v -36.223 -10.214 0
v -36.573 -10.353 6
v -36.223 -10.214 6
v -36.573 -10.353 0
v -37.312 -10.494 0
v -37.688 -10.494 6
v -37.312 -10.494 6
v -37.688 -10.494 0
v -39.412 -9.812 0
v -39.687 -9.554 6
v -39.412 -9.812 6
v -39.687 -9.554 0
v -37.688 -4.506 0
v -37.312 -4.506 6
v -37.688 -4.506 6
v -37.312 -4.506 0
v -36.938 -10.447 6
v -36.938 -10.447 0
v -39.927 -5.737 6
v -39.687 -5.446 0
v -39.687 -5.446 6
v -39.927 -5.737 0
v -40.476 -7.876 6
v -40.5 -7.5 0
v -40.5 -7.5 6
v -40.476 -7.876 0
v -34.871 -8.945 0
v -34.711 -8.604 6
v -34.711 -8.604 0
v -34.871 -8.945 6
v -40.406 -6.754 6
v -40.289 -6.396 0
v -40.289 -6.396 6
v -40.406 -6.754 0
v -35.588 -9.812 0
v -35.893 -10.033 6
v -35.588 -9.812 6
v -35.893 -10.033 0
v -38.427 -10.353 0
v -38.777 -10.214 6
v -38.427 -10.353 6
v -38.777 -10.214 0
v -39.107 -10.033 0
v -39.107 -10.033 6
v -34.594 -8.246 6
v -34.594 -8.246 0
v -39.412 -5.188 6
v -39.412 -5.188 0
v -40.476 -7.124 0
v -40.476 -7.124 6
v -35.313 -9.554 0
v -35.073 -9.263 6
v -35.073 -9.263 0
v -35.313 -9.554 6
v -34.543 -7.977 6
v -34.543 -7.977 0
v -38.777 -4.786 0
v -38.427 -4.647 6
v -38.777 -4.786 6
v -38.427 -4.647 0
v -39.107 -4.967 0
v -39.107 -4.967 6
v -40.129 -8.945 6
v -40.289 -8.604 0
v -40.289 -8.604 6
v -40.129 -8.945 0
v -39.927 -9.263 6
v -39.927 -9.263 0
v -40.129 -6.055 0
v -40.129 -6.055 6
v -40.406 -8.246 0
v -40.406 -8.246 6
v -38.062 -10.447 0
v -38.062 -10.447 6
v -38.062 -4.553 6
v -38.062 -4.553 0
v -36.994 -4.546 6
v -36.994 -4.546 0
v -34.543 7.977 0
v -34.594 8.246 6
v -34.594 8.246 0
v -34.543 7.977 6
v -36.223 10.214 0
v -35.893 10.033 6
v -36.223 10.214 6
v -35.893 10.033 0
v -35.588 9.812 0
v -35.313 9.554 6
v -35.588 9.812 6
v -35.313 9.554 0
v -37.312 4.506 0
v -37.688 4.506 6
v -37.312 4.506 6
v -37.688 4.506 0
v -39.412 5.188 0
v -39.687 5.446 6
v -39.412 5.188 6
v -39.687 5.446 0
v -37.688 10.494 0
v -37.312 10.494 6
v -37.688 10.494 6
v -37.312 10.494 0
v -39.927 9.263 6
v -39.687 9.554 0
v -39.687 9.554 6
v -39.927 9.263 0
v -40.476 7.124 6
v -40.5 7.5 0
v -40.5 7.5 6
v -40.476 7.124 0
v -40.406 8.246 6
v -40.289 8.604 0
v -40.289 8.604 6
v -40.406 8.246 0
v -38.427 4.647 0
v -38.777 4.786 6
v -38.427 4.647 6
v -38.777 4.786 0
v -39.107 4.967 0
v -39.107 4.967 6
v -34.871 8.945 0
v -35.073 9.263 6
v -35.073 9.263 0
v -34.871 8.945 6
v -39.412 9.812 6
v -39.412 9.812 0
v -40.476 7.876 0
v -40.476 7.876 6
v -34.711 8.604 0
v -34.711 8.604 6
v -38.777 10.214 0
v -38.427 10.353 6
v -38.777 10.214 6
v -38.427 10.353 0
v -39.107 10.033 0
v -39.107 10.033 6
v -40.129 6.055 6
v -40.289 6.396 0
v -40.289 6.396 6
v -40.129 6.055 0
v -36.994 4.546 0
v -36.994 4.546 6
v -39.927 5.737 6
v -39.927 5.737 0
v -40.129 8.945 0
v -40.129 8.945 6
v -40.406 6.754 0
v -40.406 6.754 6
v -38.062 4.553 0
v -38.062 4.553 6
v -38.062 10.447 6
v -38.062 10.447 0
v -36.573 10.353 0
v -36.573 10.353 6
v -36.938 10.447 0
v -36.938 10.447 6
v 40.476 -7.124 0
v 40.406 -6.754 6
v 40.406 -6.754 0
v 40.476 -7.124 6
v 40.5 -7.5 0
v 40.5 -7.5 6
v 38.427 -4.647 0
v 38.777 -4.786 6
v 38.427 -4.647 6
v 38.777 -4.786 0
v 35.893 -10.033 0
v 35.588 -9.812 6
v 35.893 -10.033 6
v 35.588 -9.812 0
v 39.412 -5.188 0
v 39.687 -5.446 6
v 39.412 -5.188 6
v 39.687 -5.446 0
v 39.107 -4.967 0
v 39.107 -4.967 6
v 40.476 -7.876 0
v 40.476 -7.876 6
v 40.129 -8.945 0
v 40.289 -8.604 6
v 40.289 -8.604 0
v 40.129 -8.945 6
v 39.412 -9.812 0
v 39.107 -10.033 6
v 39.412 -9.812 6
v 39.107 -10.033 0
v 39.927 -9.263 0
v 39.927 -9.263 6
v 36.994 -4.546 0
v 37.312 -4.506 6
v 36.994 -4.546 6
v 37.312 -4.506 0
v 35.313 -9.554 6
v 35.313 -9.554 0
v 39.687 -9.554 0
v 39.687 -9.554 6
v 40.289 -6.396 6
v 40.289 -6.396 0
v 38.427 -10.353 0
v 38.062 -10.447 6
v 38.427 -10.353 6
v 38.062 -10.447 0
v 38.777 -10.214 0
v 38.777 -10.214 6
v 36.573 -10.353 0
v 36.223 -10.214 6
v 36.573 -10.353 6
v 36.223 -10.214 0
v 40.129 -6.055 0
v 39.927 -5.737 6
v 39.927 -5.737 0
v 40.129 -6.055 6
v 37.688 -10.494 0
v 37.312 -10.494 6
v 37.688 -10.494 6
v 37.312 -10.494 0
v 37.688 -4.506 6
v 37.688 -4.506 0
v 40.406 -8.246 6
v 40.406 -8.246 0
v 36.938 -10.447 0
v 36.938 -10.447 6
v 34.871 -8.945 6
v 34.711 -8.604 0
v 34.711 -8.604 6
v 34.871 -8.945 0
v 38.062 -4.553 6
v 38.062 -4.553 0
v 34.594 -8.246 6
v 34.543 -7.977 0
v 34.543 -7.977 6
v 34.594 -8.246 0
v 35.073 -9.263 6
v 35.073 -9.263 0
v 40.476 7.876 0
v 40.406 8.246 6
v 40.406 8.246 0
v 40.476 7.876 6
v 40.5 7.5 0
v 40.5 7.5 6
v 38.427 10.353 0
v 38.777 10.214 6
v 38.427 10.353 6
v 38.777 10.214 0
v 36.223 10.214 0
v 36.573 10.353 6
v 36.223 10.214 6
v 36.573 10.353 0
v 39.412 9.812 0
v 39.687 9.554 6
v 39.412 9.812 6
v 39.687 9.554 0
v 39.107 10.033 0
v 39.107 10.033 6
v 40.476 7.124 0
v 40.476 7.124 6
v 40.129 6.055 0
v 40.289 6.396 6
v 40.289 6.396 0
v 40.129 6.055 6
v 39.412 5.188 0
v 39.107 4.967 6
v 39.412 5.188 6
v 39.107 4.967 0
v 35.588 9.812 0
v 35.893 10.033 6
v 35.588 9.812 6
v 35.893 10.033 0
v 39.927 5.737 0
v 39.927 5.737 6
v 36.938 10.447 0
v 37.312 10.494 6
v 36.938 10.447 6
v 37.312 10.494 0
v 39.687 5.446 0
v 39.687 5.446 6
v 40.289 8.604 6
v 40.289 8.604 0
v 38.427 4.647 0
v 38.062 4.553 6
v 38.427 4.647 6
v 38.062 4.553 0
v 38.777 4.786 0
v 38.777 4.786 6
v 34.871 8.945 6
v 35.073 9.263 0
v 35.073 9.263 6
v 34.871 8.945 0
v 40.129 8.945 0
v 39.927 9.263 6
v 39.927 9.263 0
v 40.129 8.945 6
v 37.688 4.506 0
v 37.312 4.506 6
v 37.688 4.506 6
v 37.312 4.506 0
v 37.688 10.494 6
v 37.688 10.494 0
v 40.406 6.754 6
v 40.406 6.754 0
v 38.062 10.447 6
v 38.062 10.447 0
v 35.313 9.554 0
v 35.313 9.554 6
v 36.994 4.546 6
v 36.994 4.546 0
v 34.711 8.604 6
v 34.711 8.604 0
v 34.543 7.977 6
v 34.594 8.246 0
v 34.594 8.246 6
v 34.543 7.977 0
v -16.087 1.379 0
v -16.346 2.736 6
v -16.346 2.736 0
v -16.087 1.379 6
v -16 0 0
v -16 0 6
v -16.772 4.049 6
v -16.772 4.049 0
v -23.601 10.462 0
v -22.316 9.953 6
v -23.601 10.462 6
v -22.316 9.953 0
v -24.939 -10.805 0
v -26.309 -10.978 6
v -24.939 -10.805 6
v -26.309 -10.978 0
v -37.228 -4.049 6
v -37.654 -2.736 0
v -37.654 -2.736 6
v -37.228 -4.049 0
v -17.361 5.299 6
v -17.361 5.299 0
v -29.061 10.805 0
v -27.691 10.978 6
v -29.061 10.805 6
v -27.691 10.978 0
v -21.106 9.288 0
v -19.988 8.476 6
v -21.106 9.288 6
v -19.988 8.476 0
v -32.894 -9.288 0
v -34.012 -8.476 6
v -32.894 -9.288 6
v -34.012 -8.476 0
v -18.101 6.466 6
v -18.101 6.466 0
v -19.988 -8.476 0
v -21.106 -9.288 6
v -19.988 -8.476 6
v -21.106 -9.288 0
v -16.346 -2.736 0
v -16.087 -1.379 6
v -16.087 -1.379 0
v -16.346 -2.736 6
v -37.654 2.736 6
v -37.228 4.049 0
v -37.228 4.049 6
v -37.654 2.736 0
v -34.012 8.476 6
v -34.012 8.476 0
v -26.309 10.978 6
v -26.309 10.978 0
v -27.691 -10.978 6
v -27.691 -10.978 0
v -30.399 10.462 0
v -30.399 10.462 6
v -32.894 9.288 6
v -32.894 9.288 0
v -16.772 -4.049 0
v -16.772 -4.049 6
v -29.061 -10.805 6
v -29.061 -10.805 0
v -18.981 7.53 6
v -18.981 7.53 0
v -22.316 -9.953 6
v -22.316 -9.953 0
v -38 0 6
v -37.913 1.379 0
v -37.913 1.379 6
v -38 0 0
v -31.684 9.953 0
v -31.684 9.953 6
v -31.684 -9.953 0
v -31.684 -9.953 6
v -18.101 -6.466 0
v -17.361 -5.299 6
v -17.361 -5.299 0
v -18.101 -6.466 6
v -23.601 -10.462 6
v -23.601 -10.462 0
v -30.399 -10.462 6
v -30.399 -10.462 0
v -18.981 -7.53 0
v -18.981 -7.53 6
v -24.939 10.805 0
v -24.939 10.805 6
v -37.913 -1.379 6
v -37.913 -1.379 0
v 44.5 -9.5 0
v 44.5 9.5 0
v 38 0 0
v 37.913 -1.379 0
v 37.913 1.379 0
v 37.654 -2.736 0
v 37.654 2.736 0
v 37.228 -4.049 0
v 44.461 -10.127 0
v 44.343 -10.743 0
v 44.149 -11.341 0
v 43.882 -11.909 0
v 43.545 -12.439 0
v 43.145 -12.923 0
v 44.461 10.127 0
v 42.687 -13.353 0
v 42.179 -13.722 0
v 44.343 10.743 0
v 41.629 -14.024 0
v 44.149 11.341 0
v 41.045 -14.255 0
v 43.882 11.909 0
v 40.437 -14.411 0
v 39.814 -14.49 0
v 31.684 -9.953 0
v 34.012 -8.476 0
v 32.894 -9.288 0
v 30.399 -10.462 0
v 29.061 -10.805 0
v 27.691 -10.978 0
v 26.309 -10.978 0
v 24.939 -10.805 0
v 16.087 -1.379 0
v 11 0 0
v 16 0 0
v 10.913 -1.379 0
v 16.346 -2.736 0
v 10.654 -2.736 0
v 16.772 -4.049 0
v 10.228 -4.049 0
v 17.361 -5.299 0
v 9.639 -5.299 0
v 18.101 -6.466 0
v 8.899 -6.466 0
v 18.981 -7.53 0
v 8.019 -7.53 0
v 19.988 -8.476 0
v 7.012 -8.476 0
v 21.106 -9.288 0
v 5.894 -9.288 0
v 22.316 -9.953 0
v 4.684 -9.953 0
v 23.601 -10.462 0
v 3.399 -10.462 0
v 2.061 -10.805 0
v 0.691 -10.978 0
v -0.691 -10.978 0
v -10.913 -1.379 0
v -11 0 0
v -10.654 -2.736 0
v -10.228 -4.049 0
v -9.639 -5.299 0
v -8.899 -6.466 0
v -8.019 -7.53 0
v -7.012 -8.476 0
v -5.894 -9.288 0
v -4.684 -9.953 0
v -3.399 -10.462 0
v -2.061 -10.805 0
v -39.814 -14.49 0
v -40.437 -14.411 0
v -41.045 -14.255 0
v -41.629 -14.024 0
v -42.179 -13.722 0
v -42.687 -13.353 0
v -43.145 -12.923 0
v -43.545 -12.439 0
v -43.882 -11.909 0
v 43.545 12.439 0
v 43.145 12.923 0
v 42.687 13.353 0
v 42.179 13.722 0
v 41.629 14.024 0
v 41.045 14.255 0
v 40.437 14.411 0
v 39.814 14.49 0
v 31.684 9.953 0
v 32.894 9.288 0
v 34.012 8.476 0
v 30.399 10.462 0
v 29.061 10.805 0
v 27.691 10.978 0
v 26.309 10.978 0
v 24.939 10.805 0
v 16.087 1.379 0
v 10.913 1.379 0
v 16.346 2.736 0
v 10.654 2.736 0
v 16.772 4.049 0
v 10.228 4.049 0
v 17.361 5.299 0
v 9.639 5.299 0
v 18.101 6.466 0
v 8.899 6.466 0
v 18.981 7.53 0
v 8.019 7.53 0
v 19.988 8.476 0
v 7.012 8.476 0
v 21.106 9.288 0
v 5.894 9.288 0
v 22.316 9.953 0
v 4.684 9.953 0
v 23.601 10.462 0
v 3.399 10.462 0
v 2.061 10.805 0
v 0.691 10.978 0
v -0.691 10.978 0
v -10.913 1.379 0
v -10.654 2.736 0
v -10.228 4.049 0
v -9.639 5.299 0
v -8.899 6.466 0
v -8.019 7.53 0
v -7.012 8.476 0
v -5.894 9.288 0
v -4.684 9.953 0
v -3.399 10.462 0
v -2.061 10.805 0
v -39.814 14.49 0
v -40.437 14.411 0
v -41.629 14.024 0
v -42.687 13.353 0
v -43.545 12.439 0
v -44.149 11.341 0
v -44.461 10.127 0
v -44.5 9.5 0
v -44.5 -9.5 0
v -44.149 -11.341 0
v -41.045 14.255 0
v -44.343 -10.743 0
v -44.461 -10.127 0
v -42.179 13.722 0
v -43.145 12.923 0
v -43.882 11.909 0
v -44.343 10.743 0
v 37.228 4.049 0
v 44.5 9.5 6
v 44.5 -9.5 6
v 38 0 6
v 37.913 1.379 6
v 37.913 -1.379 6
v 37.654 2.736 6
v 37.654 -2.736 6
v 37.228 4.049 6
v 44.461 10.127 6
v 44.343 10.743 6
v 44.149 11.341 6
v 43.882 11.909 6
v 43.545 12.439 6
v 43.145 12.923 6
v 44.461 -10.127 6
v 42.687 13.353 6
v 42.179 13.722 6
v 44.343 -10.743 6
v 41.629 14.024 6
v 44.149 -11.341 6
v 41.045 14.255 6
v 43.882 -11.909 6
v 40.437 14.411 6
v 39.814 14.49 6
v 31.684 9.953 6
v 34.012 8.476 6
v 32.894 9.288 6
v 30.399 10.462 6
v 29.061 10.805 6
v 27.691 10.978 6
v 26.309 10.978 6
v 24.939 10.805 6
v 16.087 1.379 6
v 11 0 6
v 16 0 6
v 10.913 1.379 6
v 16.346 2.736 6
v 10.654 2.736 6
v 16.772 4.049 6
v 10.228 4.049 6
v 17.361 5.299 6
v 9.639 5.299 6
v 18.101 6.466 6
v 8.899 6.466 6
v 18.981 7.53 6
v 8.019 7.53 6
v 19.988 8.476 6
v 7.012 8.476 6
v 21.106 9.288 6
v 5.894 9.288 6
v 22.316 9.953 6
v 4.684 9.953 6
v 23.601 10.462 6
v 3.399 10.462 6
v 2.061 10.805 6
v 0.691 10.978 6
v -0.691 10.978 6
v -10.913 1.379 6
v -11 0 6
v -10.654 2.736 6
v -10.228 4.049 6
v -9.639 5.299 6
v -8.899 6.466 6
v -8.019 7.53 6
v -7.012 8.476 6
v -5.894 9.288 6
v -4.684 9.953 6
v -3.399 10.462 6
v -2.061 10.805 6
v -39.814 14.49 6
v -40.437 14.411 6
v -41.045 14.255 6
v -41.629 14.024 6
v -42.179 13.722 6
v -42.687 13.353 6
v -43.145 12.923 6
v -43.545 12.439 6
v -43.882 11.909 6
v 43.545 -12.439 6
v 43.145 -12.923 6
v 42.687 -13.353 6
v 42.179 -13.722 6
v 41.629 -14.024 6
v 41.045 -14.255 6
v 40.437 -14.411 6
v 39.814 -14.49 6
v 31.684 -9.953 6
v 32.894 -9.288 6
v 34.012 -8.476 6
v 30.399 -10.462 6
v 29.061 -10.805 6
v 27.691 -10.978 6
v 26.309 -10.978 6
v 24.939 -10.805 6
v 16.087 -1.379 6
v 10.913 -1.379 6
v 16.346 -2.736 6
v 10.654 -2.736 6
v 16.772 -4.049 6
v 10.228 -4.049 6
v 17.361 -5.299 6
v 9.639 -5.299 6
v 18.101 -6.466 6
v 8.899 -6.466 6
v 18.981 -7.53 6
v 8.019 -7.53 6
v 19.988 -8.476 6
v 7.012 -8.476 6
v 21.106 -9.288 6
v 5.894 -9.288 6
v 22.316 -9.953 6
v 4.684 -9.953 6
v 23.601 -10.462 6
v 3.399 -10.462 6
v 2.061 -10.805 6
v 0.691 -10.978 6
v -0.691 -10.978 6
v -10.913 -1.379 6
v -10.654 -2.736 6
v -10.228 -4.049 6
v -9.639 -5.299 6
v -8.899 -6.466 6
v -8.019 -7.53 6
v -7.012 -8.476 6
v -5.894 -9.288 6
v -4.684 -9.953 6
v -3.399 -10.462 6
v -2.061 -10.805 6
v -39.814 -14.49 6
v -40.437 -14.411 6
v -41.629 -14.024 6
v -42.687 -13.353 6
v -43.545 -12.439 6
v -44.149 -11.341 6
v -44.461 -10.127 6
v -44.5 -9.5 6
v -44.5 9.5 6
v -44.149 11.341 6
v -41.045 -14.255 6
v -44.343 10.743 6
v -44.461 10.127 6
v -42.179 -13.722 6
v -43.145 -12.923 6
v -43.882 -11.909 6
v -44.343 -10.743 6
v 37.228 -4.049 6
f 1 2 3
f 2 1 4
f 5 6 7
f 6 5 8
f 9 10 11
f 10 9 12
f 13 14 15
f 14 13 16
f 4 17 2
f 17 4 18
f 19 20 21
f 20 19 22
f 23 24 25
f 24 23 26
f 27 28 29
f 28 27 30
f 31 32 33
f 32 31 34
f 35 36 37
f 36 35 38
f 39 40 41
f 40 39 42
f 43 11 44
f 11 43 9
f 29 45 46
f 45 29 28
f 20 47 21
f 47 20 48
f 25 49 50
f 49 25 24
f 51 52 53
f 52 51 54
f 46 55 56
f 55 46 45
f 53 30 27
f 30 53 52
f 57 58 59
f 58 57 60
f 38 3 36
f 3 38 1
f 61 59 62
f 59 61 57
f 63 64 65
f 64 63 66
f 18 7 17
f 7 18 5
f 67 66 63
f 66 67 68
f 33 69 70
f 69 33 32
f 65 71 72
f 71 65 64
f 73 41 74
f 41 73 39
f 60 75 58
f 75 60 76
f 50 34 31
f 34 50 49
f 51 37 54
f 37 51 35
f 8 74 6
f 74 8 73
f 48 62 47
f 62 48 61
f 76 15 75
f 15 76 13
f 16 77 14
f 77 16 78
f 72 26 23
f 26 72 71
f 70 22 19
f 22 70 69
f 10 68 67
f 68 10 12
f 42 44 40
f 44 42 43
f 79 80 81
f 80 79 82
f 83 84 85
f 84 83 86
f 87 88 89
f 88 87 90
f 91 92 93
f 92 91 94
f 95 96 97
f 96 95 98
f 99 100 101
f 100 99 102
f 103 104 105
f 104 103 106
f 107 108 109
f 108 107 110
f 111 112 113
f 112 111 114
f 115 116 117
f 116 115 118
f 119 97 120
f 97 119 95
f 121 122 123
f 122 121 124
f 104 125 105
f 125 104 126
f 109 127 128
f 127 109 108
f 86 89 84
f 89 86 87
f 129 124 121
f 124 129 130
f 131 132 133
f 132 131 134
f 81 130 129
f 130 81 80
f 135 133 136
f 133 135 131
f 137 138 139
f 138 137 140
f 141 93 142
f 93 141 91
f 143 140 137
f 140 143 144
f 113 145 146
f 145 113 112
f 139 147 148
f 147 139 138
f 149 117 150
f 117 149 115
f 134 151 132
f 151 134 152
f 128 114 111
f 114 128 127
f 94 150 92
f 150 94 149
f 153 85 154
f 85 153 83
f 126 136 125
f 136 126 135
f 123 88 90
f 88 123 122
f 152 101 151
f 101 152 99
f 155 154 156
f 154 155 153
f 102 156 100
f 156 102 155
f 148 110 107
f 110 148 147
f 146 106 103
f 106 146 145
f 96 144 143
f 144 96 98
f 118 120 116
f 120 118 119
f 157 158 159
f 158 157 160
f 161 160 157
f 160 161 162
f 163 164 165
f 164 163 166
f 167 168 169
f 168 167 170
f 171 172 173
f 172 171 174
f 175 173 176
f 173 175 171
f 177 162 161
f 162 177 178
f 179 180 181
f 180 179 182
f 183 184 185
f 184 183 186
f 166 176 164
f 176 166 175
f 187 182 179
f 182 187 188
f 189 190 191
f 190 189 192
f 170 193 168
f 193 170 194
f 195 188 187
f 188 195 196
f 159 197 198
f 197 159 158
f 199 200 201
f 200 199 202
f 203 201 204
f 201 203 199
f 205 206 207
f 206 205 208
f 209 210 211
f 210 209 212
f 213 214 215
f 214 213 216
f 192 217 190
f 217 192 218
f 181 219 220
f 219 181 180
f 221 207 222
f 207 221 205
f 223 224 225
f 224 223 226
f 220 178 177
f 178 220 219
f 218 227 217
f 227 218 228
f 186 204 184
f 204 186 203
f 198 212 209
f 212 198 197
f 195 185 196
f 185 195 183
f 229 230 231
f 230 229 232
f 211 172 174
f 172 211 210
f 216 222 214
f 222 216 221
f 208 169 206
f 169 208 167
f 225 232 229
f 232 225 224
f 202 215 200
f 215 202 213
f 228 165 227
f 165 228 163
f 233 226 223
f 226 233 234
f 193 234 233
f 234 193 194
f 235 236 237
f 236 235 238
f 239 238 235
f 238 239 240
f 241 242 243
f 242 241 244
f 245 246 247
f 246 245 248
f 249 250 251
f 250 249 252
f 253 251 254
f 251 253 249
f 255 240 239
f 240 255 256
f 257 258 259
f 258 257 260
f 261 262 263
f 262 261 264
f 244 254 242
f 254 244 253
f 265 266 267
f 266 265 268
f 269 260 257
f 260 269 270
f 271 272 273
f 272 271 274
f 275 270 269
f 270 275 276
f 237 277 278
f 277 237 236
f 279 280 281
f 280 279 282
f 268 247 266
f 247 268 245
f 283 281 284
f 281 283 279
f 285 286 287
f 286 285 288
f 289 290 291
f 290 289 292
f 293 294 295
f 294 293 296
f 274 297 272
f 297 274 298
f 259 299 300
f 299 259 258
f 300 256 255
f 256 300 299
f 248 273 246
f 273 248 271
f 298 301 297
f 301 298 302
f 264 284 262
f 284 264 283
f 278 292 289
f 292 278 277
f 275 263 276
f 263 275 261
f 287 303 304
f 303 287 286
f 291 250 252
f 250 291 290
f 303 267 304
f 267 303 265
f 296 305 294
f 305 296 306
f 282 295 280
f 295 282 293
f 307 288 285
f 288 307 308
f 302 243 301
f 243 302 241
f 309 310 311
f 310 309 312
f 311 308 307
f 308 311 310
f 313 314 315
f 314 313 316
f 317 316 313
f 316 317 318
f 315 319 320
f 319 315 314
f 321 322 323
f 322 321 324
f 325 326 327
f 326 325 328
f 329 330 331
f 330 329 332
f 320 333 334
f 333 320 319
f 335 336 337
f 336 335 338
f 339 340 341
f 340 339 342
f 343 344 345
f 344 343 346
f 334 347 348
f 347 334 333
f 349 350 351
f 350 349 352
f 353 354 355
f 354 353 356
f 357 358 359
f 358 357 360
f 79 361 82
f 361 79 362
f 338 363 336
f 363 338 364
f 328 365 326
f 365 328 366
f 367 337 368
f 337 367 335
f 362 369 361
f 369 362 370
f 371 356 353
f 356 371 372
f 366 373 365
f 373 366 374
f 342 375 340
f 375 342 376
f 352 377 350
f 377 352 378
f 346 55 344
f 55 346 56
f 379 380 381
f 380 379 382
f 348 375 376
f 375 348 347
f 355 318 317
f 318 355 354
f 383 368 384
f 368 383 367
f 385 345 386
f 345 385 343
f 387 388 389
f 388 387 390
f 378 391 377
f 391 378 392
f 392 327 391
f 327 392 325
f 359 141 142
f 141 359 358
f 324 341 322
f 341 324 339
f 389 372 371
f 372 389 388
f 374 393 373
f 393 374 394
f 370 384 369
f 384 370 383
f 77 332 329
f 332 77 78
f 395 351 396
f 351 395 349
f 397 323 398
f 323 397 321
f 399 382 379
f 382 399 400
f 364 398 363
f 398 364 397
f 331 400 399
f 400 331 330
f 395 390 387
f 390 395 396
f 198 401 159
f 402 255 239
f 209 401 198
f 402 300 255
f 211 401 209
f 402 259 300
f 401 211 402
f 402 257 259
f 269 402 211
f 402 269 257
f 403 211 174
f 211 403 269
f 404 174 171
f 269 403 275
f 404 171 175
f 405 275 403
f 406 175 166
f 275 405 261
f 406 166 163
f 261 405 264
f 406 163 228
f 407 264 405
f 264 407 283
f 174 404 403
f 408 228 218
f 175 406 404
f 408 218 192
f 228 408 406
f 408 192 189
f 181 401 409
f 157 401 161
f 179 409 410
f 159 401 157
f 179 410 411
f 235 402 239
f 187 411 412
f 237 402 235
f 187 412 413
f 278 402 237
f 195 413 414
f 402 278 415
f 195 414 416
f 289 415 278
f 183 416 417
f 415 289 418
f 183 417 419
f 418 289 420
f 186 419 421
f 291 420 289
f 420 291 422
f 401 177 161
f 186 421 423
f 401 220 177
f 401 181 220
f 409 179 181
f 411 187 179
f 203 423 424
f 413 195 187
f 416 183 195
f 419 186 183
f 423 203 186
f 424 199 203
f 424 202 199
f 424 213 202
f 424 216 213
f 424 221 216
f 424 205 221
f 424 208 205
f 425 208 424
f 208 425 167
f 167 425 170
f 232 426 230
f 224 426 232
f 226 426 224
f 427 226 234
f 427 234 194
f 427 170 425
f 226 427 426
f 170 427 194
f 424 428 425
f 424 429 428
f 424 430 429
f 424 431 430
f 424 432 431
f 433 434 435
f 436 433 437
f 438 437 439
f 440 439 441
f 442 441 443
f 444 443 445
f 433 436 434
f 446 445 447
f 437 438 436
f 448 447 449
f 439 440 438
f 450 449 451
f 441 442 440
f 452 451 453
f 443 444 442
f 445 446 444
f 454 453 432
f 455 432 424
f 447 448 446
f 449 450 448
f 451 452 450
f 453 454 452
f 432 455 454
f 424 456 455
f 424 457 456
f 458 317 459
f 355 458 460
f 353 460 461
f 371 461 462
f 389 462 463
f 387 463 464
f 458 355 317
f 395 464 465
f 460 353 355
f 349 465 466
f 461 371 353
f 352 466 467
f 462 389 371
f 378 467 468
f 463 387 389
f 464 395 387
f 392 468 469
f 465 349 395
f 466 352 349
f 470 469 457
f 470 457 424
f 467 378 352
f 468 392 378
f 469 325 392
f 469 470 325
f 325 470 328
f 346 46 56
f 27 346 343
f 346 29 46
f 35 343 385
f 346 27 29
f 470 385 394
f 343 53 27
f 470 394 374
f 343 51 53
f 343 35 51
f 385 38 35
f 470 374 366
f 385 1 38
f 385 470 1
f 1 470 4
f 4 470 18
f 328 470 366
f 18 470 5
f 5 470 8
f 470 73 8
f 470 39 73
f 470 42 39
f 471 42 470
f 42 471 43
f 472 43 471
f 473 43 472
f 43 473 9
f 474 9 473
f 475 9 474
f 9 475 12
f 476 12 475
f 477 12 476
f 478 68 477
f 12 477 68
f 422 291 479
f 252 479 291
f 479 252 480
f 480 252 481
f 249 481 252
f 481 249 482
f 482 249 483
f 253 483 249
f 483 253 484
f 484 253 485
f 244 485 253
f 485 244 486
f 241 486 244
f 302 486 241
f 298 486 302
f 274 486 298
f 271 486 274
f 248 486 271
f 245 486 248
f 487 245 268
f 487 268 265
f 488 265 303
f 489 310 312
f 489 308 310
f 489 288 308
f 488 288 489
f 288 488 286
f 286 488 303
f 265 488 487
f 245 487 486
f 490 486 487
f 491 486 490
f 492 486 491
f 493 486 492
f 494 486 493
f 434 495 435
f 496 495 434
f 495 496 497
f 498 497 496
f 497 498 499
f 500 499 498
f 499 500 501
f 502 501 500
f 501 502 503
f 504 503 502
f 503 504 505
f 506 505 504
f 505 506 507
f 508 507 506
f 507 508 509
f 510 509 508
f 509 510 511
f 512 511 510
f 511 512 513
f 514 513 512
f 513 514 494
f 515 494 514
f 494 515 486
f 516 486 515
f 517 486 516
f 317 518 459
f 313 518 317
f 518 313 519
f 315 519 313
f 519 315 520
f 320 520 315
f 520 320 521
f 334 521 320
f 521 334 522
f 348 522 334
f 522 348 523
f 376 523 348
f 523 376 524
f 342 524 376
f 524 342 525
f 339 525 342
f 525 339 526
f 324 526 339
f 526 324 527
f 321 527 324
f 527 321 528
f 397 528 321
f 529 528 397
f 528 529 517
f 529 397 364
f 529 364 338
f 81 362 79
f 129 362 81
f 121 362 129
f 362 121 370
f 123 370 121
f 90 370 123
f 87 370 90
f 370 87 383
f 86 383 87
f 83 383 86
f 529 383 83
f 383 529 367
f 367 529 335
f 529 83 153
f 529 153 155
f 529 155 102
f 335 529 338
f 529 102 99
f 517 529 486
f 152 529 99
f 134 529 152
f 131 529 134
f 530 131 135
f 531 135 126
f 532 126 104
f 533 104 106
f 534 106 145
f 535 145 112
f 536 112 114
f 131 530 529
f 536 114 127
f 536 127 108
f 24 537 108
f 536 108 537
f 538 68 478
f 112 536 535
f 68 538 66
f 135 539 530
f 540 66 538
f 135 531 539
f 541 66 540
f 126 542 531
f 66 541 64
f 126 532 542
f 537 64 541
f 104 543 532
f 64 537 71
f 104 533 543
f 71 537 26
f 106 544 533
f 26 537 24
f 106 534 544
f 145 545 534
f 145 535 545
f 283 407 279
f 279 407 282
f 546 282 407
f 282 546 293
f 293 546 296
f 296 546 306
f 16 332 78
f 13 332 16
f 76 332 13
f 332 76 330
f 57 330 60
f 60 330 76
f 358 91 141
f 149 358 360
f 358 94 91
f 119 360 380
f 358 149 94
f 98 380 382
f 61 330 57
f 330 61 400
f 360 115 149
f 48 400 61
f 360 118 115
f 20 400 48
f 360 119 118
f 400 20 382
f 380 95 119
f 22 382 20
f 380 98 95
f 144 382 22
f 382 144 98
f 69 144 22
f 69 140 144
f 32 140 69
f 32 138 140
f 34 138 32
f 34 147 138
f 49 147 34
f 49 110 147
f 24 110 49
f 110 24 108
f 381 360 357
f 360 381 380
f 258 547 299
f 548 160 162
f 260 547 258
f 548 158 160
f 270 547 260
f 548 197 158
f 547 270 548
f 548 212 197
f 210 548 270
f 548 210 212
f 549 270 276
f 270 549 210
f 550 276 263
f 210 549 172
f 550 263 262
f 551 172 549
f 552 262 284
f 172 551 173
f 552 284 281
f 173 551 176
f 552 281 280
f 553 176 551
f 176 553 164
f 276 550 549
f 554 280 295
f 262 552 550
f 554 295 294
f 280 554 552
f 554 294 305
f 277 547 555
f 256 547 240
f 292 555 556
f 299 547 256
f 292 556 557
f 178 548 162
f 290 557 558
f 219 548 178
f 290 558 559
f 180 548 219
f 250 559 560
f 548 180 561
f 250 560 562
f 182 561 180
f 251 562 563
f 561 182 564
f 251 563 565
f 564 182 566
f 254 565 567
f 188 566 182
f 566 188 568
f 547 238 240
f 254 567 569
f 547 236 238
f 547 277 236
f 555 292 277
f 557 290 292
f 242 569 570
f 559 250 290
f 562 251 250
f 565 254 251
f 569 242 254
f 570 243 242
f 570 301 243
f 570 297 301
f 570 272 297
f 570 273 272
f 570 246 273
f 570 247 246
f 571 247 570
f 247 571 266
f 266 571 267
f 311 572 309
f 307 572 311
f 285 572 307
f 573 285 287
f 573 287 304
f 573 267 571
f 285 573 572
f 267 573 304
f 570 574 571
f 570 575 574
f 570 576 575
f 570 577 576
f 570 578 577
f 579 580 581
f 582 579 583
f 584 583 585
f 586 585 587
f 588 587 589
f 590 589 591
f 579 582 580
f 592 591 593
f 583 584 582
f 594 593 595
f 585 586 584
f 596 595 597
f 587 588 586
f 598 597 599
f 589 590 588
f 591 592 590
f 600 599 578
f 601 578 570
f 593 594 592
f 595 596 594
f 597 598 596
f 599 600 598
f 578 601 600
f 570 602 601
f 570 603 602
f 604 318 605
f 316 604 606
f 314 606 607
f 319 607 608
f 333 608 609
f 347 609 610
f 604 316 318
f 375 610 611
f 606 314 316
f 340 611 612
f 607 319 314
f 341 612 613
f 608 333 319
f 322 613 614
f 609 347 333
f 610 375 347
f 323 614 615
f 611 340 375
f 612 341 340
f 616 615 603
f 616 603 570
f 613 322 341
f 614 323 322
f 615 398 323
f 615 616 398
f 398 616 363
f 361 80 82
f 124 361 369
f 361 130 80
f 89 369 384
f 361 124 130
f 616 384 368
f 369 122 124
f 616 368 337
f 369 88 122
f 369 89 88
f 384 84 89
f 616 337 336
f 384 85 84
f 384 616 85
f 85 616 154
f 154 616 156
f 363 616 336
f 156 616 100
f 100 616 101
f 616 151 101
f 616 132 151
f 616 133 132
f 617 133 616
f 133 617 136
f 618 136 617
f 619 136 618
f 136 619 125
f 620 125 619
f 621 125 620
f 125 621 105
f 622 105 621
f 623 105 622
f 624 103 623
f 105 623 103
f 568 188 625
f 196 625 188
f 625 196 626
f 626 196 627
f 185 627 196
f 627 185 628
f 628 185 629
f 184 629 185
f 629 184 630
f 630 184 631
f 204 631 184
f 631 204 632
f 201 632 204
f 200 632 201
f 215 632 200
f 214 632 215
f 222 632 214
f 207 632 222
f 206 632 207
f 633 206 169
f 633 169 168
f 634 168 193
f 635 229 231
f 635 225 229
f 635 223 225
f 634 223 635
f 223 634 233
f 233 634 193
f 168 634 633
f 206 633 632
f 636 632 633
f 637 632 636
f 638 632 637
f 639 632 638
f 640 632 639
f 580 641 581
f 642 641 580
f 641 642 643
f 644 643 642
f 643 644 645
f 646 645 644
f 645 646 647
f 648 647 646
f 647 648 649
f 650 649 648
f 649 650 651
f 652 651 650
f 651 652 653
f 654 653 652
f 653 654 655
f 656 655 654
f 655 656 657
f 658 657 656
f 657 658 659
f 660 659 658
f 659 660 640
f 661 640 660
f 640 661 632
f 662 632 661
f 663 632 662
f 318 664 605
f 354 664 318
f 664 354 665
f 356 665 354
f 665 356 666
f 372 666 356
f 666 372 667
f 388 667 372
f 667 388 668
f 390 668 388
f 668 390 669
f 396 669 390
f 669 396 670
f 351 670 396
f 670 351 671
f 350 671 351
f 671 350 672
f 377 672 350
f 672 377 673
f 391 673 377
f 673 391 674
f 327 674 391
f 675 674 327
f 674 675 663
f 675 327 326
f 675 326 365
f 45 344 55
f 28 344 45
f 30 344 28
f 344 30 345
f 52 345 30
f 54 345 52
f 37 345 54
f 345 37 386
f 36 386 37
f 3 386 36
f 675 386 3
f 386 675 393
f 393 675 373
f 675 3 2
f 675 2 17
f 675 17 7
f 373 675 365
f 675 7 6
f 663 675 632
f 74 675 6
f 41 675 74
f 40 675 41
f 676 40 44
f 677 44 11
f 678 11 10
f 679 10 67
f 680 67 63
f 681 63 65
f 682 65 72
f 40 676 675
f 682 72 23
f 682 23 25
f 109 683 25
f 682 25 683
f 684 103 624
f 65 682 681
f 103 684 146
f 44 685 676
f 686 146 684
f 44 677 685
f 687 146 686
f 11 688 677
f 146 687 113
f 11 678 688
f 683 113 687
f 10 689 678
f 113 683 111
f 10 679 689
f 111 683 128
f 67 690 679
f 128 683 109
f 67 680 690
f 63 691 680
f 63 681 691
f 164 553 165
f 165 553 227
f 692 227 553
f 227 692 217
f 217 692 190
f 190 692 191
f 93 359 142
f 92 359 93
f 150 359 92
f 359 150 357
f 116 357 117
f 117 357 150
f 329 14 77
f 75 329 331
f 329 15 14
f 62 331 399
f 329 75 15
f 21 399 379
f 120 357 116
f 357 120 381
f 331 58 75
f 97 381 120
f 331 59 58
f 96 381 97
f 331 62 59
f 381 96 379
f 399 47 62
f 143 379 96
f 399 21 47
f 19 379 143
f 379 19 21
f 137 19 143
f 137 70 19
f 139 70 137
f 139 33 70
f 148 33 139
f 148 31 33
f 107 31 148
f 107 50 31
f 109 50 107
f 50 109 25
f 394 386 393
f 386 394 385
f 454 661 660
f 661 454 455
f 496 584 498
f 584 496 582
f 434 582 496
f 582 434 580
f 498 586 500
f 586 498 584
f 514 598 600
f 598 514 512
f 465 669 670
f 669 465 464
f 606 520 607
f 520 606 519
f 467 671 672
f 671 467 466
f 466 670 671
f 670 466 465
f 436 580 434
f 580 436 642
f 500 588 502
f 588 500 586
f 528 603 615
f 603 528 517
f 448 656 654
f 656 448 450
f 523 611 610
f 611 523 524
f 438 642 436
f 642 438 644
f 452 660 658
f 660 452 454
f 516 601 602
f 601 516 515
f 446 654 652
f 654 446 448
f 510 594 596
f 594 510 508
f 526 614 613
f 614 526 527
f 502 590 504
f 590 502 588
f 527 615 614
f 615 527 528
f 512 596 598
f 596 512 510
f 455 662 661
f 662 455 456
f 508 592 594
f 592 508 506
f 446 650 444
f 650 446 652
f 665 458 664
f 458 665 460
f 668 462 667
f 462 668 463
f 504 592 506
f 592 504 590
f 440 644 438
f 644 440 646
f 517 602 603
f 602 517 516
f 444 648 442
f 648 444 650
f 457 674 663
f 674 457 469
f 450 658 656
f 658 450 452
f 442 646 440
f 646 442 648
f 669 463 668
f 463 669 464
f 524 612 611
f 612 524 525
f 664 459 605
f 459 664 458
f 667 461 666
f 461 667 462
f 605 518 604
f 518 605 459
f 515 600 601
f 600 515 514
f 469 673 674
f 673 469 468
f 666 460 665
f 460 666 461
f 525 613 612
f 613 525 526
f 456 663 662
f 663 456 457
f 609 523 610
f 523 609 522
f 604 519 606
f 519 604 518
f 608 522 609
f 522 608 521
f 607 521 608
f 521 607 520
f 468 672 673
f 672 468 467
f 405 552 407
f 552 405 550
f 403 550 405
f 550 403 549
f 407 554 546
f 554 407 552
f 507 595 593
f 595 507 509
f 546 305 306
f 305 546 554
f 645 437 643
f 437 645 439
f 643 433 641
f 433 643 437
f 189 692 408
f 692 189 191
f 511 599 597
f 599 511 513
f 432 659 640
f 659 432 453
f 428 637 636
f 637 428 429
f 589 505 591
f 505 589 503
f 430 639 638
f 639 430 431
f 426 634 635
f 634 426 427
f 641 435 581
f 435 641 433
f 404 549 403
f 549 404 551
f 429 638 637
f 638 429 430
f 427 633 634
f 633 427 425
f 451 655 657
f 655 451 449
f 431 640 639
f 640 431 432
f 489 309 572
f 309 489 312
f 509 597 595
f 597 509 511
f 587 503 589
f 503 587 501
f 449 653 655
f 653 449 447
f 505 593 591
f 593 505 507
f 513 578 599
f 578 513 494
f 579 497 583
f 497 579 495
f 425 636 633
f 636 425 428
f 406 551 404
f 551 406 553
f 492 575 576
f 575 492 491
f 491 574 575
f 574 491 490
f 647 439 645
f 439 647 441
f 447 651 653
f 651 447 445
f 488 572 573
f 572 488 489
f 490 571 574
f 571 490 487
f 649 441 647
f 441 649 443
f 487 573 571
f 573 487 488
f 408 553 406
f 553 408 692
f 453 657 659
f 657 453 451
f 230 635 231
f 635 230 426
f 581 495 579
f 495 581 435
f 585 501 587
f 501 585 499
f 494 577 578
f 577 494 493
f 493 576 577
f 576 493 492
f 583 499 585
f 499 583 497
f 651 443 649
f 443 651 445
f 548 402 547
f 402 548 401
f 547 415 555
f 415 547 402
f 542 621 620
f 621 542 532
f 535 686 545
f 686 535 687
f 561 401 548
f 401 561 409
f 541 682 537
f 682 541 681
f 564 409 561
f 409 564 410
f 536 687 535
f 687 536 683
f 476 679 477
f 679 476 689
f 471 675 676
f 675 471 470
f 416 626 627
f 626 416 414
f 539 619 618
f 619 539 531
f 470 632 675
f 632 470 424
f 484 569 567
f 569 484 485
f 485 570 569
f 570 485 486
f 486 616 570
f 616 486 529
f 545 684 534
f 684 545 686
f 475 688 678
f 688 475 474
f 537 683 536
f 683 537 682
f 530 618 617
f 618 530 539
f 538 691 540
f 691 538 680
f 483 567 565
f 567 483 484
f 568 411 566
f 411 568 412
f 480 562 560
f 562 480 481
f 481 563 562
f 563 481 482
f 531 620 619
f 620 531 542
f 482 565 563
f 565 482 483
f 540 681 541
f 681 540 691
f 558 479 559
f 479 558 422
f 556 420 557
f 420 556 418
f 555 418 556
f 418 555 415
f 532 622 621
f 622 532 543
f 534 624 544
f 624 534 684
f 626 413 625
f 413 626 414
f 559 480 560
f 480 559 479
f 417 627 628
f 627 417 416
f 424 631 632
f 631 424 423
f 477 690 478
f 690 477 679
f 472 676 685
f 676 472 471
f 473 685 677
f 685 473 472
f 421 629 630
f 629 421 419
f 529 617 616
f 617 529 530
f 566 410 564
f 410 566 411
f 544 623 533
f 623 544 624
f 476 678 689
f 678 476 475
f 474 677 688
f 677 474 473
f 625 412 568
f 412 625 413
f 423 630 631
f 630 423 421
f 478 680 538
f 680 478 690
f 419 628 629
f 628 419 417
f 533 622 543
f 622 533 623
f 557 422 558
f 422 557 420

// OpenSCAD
$fn = 50;


difference() {
	union() {
		hull() {
			translate(v = [-39.5000000000, 9.5000000000, 0]) {
				cylinder(h = 6, r = 5);
			}
			translate(v = [39.5000000000, 9.5000000000, 0]) {
				cylinder(h = 6, r = 5);
			}
			translate(v = [-39.5000000000, -9.5000000000, 0]) {
				cylinder(h = 6, r = 5);
			}
			translate(v = [39.5000000000, -9.5000000000, 0]) {
				cylinder(h = 6, r = 5);
			}
		}
	}
	union() {
		#translate(v = [-37.5000000000, -7.5000000000, -100.0000000000]) {
			cylinder(h = 200, r = 3.0000000000);
		}
		#translate(v = [-37.5000000000, 7.5000000000, -100.0000000000]) {
			cylinder(h = 200, r = 3.0000000000);
		}
		#translate(v = [37.5000000000, -7.5000000000, -100.0000000000]) {
			cylinder(h = 200, r = 3.0000000000);
		}
		#translate(v = [37.5000000000, 7.5000000000, -100.0000000000]) {
			cylinder(h = 200, r = 3.0000000000);
		}
		#translate(v = [-27.0000000000, 0, 0]) {
			cylinder(h = 6, r = 11.0000000000);
		}
		#cylinder(h = 6, r = 11.0000000000);
		#translate(v = [27.0000000000, 0, 0]) {
			cylinder(h = 6, r = 11.0000000000);
		}
	}
}
